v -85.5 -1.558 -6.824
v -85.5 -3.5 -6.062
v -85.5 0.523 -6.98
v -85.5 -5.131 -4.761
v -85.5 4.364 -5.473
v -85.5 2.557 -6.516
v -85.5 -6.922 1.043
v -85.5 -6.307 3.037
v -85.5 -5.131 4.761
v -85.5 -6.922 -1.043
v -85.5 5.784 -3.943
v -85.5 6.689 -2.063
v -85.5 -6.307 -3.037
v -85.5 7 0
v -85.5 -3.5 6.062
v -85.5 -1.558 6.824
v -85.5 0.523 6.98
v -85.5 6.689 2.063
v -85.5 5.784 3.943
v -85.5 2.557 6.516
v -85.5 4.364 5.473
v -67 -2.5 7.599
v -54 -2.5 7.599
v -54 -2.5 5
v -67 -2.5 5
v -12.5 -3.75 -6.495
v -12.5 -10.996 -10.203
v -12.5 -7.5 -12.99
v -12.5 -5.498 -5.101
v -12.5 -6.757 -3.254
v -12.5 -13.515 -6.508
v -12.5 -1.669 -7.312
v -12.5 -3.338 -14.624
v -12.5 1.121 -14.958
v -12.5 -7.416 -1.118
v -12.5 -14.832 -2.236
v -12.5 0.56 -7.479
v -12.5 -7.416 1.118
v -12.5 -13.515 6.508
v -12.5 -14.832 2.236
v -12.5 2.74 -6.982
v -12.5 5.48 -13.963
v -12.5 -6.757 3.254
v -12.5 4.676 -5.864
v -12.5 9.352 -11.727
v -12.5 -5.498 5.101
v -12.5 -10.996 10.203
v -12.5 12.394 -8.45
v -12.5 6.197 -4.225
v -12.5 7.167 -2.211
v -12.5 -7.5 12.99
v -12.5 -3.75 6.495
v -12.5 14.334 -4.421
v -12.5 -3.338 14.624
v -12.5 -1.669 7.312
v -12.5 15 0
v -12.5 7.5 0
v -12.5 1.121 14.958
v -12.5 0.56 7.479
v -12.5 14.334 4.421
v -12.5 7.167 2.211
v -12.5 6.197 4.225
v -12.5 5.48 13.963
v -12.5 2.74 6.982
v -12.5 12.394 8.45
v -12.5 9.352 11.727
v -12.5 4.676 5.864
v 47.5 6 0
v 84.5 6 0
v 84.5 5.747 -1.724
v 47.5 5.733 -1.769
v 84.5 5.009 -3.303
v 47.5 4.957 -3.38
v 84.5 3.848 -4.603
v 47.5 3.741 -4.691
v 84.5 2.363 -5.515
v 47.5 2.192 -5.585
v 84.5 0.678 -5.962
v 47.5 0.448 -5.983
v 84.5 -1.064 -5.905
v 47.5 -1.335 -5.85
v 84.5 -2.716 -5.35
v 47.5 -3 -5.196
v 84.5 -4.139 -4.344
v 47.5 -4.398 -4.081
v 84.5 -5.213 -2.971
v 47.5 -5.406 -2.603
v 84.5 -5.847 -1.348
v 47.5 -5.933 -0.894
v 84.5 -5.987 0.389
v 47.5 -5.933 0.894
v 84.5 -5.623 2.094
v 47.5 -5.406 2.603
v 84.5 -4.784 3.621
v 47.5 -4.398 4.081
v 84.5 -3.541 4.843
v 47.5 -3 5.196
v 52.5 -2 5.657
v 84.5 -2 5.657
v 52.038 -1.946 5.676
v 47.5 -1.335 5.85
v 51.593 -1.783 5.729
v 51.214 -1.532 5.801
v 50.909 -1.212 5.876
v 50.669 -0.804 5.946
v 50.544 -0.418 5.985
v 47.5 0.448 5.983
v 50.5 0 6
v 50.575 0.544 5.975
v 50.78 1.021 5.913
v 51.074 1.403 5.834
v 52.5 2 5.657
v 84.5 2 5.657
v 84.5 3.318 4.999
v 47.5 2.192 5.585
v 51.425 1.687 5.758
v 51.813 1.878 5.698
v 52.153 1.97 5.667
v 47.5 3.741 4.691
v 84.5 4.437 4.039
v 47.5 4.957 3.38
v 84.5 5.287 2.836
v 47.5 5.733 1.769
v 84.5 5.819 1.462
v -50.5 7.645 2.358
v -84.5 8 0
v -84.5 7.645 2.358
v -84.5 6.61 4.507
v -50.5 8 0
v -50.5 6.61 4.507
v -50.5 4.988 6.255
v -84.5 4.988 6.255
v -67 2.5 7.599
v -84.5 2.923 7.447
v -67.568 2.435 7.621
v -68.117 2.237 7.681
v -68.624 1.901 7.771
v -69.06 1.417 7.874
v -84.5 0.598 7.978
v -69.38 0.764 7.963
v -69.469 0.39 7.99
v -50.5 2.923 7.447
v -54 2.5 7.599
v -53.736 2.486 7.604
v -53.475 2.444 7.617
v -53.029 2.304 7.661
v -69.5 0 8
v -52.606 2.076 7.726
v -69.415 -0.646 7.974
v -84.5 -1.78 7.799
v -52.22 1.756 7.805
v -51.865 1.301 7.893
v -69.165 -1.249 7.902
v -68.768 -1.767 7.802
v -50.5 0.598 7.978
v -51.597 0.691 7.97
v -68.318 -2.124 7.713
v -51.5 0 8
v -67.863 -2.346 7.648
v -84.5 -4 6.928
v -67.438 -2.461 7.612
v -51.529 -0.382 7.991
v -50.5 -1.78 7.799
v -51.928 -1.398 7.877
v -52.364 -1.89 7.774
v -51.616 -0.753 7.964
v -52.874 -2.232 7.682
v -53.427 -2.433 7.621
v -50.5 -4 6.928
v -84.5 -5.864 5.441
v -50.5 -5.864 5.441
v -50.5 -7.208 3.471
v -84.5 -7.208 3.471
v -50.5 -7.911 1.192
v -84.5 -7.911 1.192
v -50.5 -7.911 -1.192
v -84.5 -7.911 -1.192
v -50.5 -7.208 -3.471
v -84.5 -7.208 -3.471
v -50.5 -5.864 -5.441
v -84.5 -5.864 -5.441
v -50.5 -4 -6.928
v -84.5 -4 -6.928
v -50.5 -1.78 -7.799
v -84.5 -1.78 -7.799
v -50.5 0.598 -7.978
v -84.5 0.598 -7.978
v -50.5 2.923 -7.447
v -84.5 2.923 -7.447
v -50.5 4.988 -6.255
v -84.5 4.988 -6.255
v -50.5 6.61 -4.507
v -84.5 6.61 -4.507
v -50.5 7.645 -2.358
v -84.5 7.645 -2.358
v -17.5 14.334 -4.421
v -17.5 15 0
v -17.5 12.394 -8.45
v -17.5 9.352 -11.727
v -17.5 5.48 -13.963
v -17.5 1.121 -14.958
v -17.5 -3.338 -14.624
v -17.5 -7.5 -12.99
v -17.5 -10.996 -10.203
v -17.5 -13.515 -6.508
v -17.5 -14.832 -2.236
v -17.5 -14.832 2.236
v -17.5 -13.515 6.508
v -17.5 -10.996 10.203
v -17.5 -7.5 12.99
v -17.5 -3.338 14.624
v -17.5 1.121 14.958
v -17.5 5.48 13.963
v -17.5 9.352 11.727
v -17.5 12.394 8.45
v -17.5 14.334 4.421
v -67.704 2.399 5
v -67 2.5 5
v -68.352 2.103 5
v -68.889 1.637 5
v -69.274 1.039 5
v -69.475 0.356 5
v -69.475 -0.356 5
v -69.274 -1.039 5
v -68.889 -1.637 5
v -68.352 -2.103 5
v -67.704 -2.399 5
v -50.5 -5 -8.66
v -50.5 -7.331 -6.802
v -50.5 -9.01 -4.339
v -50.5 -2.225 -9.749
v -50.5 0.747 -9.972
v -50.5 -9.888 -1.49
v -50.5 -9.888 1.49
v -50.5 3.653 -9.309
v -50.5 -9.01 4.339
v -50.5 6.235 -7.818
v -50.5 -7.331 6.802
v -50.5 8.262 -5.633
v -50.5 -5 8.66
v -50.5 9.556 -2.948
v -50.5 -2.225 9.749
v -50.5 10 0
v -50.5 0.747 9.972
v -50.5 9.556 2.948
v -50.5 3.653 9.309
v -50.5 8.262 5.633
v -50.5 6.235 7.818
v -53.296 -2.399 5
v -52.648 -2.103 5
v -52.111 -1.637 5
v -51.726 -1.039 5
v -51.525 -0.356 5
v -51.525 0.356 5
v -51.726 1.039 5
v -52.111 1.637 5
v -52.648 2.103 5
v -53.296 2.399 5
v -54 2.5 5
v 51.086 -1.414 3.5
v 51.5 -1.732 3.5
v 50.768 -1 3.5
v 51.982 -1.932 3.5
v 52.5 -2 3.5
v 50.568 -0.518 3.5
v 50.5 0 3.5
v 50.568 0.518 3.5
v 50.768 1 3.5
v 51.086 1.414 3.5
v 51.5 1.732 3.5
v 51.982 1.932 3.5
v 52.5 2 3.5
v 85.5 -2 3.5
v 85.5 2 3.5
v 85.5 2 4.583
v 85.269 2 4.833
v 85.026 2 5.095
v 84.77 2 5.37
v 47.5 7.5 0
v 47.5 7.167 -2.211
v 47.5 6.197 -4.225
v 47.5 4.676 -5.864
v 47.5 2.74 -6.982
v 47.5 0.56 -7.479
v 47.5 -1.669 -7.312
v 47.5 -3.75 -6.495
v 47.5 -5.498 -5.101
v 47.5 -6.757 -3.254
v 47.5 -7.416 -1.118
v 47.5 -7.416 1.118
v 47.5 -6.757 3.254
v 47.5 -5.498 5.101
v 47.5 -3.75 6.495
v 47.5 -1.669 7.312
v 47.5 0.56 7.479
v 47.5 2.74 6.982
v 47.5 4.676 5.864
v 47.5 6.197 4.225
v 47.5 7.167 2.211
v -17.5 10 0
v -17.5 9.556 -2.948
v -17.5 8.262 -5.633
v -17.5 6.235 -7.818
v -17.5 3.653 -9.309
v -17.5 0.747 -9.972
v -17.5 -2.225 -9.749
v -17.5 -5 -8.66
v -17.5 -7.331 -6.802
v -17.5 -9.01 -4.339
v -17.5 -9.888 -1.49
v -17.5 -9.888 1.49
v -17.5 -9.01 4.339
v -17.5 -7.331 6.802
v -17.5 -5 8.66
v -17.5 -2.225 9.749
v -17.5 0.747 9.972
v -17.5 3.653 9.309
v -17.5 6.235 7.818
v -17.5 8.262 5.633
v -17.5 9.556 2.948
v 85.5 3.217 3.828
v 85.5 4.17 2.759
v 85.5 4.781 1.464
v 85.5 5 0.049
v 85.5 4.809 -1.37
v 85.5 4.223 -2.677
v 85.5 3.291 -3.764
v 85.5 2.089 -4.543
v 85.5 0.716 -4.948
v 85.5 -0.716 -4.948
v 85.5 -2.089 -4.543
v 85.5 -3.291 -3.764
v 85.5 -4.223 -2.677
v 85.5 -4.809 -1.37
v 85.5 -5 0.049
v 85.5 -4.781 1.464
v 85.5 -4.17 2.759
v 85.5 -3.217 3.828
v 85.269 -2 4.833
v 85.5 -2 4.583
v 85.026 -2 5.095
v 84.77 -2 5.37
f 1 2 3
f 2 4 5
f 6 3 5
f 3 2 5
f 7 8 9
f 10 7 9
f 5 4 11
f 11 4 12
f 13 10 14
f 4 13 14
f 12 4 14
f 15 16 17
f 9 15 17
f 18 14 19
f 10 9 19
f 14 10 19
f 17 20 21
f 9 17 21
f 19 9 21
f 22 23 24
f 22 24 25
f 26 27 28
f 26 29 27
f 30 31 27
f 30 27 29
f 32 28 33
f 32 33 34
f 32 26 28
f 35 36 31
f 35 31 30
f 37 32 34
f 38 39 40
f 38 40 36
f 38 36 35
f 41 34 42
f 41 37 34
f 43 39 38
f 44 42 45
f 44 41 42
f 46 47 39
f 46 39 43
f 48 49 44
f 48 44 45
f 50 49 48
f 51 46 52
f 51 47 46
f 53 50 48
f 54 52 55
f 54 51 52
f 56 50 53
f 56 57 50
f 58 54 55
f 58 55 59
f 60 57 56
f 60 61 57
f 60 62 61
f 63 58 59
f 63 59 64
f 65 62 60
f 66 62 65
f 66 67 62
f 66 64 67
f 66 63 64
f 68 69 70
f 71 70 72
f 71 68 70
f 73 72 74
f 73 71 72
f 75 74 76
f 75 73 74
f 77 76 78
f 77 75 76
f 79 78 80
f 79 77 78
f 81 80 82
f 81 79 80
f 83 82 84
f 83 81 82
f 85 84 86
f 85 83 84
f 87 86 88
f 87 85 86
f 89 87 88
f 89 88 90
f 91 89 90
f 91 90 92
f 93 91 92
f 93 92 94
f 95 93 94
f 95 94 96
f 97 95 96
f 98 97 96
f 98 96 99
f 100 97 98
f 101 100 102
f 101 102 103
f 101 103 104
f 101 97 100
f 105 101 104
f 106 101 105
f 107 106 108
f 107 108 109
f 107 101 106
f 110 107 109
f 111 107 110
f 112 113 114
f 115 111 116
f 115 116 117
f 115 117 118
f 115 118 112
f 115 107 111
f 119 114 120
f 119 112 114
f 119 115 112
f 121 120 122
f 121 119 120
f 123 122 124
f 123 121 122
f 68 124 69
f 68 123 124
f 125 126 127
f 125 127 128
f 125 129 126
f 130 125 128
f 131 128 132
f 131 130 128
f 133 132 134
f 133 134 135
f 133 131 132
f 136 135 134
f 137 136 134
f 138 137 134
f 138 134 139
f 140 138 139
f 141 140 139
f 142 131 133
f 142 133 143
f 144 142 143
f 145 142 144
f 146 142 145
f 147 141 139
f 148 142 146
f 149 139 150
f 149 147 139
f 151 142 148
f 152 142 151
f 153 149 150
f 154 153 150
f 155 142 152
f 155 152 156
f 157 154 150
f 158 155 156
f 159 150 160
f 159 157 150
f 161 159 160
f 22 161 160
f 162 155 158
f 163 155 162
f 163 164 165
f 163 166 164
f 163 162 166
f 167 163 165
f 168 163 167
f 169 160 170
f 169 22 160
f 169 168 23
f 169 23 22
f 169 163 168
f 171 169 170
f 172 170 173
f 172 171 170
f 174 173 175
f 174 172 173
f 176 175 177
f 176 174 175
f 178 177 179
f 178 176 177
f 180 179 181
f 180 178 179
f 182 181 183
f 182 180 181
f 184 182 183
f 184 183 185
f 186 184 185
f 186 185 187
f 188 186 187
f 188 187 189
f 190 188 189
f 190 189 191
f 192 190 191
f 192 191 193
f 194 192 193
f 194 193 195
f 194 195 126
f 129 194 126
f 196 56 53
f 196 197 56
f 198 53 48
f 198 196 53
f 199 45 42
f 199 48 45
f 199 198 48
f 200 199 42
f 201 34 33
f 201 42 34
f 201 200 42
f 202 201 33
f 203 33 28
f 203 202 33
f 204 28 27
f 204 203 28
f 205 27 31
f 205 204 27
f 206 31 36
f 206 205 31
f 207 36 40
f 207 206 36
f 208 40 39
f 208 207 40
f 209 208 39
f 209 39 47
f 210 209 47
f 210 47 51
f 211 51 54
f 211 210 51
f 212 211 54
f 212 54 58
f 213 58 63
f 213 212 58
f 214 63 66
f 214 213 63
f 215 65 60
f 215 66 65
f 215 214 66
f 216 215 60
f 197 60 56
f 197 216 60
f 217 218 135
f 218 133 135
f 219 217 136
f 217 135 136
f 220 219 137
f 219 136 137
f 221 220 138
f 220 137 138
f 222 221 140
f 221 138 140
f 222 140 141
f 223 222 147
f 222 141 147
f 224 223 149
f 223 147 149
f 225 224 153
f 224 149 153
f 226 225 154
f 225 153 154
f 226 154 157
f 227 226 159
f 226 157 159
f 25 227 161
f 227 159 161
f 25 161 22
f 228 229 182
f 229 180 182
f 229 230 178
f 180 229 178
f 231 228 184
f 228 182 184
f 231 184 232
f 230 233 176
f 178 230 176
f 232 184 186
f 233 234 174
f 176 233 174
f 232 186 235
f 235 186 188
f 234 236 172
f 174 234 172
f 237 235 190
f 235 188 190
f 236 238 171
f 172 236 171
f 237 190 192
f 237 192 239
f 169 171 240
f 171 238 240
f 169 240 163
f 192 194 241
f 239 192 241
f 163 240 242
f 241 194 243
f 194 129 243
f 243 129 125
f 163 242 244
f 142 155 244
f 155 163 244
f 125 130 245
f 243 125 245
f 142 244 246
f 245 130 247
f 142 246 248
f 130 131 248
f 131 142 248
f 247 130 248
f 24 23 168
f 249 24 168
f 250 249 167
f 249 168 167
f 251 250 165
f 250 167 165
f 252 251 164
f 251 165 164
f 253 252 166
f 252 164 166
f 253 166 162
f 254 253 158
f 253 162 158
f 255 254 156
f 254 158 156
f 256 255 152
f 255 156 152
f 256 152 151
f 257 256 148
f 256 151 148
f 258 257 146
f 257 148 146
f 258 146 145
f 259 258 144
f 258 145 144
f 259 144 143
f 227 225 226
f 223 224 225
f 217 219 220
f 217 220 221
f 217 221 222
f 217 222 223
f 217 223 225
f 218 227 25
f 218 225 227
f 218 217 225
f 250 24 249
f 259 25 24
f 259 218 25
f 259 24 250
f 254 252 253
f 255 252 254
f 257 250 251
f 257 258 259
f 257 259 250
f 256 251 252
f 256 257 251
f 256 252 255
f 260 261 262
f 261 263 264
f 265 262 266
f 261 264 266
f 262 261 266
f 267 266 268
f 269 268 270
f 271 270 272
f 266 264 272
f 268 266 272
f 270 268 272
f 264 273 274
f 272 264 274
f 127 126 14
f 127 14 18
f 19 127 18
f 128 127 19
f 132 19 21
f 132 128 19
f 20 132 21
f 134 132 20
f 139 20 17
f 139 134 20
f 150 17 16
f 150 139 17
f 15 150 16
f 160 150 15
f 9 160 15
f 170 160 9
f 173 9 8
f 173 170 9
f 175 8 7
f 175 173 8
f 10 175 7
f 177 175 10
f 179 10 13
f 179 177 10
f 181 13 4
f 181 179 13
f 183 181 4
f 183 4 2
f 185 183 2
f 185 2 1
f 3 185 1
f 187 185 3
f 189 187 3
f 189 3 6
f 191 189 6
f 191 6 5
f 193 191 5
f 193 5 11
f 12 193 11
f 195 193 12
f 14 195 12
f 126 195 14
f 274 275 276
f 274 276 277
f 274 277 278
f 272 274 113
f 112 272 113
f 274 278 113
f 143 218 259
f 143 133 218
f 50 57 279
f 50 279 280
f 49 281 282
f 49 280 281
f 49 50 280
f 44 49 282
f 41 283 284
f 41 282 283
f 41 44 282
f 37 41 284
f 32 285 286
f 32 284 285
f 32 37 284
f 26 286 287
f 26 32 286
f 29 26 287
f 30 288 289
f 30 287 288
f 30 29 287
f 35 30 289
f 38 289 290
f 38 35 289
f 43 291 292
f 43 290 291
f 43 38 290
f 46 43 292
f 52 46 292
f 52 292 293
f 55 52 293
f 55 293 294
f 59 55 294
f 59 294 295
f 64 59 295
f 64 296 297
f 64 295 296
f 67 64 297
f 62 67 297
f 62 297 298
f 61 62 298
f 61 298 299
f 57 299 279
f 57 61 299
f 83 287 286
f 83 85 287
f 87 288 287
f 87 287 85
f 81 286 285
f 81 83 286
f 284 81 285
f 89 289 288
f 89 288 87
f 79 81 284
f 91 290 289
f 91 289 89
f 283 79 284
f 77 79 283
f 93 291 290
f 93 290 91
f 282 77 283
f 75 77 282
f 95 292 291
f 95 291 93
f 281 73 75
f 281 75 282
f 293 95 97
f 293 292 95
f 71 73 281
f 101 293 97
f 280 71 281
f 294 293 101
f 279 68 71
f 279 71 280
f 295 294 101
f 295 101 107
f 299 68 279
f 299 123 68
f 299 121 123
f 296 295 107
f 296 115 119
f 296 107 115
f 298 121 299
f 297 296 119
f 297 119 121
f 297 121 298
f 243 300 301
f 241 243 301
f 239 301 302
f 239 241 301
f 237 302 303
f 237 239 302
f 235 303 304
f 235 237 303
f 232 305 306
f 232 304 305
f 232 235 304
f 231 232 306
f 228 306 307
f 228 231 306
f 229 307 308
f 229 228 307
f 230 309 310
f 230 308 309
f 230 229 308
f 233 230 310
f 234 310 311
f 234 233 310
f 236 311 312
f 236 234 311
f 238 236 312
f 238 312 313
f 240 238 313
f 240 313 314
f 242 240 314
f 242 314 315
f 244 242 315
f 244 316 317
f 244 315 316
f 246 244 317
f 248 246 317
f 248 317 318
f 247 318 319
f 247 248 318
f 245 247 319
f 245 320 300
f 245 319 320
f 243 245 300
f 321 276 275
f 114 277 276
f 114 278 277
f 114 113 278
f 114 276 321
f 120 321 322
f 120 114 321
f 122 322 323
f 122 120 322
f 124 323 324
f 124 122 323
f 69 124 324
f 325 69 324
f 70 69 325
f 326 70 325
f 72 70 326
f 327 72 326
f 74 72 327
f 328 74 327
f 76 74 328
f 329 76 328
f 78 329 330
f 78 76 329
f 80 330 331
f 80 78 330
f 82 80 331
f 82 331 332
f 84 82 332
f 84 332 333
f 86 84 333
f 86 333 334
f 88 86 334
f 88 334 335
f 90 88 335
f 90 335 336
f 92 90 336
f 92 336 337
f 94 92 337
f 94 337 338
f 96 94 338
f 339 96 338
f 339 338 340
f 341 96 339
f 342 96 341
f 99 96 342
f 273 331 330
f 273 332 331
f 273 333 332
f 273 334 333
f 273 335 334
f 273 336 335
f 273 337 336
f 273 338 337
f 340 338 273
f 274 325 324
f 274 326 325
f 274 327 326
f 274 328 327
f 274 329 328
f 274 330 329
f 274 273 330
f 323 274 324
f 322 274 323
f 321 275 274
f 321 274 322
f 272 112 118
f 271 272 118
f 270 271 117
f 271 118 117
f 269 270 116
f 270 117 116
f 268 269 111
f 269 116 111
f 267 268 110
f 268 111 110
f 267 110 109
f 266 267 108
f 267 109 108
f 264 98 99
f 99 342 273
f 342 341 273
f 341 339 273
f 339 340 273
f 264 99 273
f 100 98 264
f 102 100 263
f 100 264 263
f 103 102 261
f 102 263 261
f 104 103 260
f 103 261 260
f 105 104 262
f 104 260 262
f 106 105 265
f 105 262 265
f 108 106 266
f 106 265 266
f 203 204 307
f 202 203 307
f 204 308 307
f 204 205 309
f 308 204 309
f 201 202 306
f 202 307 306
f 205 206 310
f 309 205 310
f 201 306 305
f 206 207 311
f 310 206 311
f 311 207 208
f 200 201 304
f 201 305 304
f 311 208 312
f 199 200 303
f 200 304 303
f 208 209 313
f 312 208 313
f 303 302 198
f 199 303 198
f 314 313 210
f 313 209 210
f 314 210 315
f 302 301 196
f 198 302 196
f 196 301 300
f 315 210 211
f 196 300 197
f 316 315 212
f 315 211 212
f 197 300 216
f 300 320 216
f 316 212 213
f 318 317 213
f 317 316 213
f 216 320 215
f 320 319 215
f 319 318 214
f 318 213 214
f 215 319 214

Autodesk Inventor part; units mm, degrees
ref_plane "YZ Plane" through (0, 0, 0) normal (1, 0, 0) x (0, 1, 0)
ref_plane "XZ Plane" through (0, 0, 0) normal (0, 1, 0) x (-1, 0, 0)
sketch "Sketch1" plane through (0, 0, 0) normal (0, 0, 1) x (1, 0, 0)
  line L0 (-85.5, 0) -> (85.5, 0)
  line L1 (85.5, 0) -> (85.5, 6)
  line L2 (85.5, 6) -> (47.5, 6)
  line L3 (47.5, 6) -> (47.5, 7.5)
  line L4 (47.5, 7.5) -> (-12.5, 7.5)
  line L5 (-12.5, 7.5) -> (-12.5, 15)
  line L6 (-12.5, 15) -> (-17.5, 15)
  line L7 (-17.5, 15) -> (-17.5, 10)
  line L8 (-17.5, 10) -> (-50.5, 10)
  line L9 (-85.5, 0) -> (-85.5, 8)
  line L10 (-85.5, 8) -> (-50.5, 8)
  line L11 (-50.5, 10) -> (-50.5, 8)
  point P0 (0, 0)
  point P1 (0, 0)
  dimension "d8" = 12
  dimension "d9" = 15
  dimension "d10" = 30
  dimension "d11" = 20
  dimension "d12" = 98
  dimension "d13" = 5
  dimension "d14" = 60
  dimension "d15" = 33
  dimension "d16" = 16
  dimension "d43" = 68
revolve "Revolution1" add sketch "Sketch1" angle 360 about axis through (-85.5, 0, 0) along (1, 0, 0)
thread "Thread1" size "M12x1.5" class "6g" standard "ISO Metric profile" length 10
chamfer "Chamfer1" distance 1 angle 45 2 edges at (85.5, -6, 0) (-85.5, -8, 0)
sketch "Sketch4" plane through (85.5, 0, 0) normal (1, 0, 0) x (0, 0, -1)
  circle A0 centre (0, 0) radius 6 projected
  line L0 (-5.6569, -2) -> (-3.5, -2)
  line L1 (-3.5, -2) -> (-3.5, 2)
  line L2 (-3.5, 2) -> (-5.6569, 2)
  point P0 (0, 0)
  dimension "d35" = 9.5
  dimension "d36" = 4
extrude "Extrusion3" cut sketch "Sketch4" against normal blind 35 contours L2 L1 L0 A0 picked at (-4.3205, -0.2261)
full round fillet "Full Round Fillet1" first side at (73.5, -2, 4.219) centre faces at (50.5, 0.2261, 4.3205) second side at (73.5, 2, 4.219)
thread "Thread2" size "M16x2" class "6g" standard "ANSI Metric M Profile" length 17
ref_plane "Work Plane2" through (-68, 0, 8) normal (0, 0, 1) x (1, 0, 0)
sketch "Sketch3" plane through (-68, 0, 8) normal (0, 0, 1) x (1, 0, 0)
  line L0 (14, -2.5) -> (1, -2.5)
  arc A0 (1, 2.5) -> (1, -2.5) centre (1, 0) ccw
  line L1 (1, 2.5) -> (14, 2.5)
  arc A1 (14, -2.5) -> (14, 2.5) centre (14, 0) ccw
  line L2 (-51.7, 0) -> (187.7, 0) projected
  line L3 (-17.5, -7) -> (-17.5, 7) projected
  point P0 (68, 0)
  point P1 (16.5, 0)
  point P2 (-1.5, 0)
  dimension "d40" = 18
  dimension "d41" = 5
  dimension "d42" = 16
extrude "Extrusion2" cut sketch "Sketch3" against normal blind 3
properties material "Steel, Alloy"
